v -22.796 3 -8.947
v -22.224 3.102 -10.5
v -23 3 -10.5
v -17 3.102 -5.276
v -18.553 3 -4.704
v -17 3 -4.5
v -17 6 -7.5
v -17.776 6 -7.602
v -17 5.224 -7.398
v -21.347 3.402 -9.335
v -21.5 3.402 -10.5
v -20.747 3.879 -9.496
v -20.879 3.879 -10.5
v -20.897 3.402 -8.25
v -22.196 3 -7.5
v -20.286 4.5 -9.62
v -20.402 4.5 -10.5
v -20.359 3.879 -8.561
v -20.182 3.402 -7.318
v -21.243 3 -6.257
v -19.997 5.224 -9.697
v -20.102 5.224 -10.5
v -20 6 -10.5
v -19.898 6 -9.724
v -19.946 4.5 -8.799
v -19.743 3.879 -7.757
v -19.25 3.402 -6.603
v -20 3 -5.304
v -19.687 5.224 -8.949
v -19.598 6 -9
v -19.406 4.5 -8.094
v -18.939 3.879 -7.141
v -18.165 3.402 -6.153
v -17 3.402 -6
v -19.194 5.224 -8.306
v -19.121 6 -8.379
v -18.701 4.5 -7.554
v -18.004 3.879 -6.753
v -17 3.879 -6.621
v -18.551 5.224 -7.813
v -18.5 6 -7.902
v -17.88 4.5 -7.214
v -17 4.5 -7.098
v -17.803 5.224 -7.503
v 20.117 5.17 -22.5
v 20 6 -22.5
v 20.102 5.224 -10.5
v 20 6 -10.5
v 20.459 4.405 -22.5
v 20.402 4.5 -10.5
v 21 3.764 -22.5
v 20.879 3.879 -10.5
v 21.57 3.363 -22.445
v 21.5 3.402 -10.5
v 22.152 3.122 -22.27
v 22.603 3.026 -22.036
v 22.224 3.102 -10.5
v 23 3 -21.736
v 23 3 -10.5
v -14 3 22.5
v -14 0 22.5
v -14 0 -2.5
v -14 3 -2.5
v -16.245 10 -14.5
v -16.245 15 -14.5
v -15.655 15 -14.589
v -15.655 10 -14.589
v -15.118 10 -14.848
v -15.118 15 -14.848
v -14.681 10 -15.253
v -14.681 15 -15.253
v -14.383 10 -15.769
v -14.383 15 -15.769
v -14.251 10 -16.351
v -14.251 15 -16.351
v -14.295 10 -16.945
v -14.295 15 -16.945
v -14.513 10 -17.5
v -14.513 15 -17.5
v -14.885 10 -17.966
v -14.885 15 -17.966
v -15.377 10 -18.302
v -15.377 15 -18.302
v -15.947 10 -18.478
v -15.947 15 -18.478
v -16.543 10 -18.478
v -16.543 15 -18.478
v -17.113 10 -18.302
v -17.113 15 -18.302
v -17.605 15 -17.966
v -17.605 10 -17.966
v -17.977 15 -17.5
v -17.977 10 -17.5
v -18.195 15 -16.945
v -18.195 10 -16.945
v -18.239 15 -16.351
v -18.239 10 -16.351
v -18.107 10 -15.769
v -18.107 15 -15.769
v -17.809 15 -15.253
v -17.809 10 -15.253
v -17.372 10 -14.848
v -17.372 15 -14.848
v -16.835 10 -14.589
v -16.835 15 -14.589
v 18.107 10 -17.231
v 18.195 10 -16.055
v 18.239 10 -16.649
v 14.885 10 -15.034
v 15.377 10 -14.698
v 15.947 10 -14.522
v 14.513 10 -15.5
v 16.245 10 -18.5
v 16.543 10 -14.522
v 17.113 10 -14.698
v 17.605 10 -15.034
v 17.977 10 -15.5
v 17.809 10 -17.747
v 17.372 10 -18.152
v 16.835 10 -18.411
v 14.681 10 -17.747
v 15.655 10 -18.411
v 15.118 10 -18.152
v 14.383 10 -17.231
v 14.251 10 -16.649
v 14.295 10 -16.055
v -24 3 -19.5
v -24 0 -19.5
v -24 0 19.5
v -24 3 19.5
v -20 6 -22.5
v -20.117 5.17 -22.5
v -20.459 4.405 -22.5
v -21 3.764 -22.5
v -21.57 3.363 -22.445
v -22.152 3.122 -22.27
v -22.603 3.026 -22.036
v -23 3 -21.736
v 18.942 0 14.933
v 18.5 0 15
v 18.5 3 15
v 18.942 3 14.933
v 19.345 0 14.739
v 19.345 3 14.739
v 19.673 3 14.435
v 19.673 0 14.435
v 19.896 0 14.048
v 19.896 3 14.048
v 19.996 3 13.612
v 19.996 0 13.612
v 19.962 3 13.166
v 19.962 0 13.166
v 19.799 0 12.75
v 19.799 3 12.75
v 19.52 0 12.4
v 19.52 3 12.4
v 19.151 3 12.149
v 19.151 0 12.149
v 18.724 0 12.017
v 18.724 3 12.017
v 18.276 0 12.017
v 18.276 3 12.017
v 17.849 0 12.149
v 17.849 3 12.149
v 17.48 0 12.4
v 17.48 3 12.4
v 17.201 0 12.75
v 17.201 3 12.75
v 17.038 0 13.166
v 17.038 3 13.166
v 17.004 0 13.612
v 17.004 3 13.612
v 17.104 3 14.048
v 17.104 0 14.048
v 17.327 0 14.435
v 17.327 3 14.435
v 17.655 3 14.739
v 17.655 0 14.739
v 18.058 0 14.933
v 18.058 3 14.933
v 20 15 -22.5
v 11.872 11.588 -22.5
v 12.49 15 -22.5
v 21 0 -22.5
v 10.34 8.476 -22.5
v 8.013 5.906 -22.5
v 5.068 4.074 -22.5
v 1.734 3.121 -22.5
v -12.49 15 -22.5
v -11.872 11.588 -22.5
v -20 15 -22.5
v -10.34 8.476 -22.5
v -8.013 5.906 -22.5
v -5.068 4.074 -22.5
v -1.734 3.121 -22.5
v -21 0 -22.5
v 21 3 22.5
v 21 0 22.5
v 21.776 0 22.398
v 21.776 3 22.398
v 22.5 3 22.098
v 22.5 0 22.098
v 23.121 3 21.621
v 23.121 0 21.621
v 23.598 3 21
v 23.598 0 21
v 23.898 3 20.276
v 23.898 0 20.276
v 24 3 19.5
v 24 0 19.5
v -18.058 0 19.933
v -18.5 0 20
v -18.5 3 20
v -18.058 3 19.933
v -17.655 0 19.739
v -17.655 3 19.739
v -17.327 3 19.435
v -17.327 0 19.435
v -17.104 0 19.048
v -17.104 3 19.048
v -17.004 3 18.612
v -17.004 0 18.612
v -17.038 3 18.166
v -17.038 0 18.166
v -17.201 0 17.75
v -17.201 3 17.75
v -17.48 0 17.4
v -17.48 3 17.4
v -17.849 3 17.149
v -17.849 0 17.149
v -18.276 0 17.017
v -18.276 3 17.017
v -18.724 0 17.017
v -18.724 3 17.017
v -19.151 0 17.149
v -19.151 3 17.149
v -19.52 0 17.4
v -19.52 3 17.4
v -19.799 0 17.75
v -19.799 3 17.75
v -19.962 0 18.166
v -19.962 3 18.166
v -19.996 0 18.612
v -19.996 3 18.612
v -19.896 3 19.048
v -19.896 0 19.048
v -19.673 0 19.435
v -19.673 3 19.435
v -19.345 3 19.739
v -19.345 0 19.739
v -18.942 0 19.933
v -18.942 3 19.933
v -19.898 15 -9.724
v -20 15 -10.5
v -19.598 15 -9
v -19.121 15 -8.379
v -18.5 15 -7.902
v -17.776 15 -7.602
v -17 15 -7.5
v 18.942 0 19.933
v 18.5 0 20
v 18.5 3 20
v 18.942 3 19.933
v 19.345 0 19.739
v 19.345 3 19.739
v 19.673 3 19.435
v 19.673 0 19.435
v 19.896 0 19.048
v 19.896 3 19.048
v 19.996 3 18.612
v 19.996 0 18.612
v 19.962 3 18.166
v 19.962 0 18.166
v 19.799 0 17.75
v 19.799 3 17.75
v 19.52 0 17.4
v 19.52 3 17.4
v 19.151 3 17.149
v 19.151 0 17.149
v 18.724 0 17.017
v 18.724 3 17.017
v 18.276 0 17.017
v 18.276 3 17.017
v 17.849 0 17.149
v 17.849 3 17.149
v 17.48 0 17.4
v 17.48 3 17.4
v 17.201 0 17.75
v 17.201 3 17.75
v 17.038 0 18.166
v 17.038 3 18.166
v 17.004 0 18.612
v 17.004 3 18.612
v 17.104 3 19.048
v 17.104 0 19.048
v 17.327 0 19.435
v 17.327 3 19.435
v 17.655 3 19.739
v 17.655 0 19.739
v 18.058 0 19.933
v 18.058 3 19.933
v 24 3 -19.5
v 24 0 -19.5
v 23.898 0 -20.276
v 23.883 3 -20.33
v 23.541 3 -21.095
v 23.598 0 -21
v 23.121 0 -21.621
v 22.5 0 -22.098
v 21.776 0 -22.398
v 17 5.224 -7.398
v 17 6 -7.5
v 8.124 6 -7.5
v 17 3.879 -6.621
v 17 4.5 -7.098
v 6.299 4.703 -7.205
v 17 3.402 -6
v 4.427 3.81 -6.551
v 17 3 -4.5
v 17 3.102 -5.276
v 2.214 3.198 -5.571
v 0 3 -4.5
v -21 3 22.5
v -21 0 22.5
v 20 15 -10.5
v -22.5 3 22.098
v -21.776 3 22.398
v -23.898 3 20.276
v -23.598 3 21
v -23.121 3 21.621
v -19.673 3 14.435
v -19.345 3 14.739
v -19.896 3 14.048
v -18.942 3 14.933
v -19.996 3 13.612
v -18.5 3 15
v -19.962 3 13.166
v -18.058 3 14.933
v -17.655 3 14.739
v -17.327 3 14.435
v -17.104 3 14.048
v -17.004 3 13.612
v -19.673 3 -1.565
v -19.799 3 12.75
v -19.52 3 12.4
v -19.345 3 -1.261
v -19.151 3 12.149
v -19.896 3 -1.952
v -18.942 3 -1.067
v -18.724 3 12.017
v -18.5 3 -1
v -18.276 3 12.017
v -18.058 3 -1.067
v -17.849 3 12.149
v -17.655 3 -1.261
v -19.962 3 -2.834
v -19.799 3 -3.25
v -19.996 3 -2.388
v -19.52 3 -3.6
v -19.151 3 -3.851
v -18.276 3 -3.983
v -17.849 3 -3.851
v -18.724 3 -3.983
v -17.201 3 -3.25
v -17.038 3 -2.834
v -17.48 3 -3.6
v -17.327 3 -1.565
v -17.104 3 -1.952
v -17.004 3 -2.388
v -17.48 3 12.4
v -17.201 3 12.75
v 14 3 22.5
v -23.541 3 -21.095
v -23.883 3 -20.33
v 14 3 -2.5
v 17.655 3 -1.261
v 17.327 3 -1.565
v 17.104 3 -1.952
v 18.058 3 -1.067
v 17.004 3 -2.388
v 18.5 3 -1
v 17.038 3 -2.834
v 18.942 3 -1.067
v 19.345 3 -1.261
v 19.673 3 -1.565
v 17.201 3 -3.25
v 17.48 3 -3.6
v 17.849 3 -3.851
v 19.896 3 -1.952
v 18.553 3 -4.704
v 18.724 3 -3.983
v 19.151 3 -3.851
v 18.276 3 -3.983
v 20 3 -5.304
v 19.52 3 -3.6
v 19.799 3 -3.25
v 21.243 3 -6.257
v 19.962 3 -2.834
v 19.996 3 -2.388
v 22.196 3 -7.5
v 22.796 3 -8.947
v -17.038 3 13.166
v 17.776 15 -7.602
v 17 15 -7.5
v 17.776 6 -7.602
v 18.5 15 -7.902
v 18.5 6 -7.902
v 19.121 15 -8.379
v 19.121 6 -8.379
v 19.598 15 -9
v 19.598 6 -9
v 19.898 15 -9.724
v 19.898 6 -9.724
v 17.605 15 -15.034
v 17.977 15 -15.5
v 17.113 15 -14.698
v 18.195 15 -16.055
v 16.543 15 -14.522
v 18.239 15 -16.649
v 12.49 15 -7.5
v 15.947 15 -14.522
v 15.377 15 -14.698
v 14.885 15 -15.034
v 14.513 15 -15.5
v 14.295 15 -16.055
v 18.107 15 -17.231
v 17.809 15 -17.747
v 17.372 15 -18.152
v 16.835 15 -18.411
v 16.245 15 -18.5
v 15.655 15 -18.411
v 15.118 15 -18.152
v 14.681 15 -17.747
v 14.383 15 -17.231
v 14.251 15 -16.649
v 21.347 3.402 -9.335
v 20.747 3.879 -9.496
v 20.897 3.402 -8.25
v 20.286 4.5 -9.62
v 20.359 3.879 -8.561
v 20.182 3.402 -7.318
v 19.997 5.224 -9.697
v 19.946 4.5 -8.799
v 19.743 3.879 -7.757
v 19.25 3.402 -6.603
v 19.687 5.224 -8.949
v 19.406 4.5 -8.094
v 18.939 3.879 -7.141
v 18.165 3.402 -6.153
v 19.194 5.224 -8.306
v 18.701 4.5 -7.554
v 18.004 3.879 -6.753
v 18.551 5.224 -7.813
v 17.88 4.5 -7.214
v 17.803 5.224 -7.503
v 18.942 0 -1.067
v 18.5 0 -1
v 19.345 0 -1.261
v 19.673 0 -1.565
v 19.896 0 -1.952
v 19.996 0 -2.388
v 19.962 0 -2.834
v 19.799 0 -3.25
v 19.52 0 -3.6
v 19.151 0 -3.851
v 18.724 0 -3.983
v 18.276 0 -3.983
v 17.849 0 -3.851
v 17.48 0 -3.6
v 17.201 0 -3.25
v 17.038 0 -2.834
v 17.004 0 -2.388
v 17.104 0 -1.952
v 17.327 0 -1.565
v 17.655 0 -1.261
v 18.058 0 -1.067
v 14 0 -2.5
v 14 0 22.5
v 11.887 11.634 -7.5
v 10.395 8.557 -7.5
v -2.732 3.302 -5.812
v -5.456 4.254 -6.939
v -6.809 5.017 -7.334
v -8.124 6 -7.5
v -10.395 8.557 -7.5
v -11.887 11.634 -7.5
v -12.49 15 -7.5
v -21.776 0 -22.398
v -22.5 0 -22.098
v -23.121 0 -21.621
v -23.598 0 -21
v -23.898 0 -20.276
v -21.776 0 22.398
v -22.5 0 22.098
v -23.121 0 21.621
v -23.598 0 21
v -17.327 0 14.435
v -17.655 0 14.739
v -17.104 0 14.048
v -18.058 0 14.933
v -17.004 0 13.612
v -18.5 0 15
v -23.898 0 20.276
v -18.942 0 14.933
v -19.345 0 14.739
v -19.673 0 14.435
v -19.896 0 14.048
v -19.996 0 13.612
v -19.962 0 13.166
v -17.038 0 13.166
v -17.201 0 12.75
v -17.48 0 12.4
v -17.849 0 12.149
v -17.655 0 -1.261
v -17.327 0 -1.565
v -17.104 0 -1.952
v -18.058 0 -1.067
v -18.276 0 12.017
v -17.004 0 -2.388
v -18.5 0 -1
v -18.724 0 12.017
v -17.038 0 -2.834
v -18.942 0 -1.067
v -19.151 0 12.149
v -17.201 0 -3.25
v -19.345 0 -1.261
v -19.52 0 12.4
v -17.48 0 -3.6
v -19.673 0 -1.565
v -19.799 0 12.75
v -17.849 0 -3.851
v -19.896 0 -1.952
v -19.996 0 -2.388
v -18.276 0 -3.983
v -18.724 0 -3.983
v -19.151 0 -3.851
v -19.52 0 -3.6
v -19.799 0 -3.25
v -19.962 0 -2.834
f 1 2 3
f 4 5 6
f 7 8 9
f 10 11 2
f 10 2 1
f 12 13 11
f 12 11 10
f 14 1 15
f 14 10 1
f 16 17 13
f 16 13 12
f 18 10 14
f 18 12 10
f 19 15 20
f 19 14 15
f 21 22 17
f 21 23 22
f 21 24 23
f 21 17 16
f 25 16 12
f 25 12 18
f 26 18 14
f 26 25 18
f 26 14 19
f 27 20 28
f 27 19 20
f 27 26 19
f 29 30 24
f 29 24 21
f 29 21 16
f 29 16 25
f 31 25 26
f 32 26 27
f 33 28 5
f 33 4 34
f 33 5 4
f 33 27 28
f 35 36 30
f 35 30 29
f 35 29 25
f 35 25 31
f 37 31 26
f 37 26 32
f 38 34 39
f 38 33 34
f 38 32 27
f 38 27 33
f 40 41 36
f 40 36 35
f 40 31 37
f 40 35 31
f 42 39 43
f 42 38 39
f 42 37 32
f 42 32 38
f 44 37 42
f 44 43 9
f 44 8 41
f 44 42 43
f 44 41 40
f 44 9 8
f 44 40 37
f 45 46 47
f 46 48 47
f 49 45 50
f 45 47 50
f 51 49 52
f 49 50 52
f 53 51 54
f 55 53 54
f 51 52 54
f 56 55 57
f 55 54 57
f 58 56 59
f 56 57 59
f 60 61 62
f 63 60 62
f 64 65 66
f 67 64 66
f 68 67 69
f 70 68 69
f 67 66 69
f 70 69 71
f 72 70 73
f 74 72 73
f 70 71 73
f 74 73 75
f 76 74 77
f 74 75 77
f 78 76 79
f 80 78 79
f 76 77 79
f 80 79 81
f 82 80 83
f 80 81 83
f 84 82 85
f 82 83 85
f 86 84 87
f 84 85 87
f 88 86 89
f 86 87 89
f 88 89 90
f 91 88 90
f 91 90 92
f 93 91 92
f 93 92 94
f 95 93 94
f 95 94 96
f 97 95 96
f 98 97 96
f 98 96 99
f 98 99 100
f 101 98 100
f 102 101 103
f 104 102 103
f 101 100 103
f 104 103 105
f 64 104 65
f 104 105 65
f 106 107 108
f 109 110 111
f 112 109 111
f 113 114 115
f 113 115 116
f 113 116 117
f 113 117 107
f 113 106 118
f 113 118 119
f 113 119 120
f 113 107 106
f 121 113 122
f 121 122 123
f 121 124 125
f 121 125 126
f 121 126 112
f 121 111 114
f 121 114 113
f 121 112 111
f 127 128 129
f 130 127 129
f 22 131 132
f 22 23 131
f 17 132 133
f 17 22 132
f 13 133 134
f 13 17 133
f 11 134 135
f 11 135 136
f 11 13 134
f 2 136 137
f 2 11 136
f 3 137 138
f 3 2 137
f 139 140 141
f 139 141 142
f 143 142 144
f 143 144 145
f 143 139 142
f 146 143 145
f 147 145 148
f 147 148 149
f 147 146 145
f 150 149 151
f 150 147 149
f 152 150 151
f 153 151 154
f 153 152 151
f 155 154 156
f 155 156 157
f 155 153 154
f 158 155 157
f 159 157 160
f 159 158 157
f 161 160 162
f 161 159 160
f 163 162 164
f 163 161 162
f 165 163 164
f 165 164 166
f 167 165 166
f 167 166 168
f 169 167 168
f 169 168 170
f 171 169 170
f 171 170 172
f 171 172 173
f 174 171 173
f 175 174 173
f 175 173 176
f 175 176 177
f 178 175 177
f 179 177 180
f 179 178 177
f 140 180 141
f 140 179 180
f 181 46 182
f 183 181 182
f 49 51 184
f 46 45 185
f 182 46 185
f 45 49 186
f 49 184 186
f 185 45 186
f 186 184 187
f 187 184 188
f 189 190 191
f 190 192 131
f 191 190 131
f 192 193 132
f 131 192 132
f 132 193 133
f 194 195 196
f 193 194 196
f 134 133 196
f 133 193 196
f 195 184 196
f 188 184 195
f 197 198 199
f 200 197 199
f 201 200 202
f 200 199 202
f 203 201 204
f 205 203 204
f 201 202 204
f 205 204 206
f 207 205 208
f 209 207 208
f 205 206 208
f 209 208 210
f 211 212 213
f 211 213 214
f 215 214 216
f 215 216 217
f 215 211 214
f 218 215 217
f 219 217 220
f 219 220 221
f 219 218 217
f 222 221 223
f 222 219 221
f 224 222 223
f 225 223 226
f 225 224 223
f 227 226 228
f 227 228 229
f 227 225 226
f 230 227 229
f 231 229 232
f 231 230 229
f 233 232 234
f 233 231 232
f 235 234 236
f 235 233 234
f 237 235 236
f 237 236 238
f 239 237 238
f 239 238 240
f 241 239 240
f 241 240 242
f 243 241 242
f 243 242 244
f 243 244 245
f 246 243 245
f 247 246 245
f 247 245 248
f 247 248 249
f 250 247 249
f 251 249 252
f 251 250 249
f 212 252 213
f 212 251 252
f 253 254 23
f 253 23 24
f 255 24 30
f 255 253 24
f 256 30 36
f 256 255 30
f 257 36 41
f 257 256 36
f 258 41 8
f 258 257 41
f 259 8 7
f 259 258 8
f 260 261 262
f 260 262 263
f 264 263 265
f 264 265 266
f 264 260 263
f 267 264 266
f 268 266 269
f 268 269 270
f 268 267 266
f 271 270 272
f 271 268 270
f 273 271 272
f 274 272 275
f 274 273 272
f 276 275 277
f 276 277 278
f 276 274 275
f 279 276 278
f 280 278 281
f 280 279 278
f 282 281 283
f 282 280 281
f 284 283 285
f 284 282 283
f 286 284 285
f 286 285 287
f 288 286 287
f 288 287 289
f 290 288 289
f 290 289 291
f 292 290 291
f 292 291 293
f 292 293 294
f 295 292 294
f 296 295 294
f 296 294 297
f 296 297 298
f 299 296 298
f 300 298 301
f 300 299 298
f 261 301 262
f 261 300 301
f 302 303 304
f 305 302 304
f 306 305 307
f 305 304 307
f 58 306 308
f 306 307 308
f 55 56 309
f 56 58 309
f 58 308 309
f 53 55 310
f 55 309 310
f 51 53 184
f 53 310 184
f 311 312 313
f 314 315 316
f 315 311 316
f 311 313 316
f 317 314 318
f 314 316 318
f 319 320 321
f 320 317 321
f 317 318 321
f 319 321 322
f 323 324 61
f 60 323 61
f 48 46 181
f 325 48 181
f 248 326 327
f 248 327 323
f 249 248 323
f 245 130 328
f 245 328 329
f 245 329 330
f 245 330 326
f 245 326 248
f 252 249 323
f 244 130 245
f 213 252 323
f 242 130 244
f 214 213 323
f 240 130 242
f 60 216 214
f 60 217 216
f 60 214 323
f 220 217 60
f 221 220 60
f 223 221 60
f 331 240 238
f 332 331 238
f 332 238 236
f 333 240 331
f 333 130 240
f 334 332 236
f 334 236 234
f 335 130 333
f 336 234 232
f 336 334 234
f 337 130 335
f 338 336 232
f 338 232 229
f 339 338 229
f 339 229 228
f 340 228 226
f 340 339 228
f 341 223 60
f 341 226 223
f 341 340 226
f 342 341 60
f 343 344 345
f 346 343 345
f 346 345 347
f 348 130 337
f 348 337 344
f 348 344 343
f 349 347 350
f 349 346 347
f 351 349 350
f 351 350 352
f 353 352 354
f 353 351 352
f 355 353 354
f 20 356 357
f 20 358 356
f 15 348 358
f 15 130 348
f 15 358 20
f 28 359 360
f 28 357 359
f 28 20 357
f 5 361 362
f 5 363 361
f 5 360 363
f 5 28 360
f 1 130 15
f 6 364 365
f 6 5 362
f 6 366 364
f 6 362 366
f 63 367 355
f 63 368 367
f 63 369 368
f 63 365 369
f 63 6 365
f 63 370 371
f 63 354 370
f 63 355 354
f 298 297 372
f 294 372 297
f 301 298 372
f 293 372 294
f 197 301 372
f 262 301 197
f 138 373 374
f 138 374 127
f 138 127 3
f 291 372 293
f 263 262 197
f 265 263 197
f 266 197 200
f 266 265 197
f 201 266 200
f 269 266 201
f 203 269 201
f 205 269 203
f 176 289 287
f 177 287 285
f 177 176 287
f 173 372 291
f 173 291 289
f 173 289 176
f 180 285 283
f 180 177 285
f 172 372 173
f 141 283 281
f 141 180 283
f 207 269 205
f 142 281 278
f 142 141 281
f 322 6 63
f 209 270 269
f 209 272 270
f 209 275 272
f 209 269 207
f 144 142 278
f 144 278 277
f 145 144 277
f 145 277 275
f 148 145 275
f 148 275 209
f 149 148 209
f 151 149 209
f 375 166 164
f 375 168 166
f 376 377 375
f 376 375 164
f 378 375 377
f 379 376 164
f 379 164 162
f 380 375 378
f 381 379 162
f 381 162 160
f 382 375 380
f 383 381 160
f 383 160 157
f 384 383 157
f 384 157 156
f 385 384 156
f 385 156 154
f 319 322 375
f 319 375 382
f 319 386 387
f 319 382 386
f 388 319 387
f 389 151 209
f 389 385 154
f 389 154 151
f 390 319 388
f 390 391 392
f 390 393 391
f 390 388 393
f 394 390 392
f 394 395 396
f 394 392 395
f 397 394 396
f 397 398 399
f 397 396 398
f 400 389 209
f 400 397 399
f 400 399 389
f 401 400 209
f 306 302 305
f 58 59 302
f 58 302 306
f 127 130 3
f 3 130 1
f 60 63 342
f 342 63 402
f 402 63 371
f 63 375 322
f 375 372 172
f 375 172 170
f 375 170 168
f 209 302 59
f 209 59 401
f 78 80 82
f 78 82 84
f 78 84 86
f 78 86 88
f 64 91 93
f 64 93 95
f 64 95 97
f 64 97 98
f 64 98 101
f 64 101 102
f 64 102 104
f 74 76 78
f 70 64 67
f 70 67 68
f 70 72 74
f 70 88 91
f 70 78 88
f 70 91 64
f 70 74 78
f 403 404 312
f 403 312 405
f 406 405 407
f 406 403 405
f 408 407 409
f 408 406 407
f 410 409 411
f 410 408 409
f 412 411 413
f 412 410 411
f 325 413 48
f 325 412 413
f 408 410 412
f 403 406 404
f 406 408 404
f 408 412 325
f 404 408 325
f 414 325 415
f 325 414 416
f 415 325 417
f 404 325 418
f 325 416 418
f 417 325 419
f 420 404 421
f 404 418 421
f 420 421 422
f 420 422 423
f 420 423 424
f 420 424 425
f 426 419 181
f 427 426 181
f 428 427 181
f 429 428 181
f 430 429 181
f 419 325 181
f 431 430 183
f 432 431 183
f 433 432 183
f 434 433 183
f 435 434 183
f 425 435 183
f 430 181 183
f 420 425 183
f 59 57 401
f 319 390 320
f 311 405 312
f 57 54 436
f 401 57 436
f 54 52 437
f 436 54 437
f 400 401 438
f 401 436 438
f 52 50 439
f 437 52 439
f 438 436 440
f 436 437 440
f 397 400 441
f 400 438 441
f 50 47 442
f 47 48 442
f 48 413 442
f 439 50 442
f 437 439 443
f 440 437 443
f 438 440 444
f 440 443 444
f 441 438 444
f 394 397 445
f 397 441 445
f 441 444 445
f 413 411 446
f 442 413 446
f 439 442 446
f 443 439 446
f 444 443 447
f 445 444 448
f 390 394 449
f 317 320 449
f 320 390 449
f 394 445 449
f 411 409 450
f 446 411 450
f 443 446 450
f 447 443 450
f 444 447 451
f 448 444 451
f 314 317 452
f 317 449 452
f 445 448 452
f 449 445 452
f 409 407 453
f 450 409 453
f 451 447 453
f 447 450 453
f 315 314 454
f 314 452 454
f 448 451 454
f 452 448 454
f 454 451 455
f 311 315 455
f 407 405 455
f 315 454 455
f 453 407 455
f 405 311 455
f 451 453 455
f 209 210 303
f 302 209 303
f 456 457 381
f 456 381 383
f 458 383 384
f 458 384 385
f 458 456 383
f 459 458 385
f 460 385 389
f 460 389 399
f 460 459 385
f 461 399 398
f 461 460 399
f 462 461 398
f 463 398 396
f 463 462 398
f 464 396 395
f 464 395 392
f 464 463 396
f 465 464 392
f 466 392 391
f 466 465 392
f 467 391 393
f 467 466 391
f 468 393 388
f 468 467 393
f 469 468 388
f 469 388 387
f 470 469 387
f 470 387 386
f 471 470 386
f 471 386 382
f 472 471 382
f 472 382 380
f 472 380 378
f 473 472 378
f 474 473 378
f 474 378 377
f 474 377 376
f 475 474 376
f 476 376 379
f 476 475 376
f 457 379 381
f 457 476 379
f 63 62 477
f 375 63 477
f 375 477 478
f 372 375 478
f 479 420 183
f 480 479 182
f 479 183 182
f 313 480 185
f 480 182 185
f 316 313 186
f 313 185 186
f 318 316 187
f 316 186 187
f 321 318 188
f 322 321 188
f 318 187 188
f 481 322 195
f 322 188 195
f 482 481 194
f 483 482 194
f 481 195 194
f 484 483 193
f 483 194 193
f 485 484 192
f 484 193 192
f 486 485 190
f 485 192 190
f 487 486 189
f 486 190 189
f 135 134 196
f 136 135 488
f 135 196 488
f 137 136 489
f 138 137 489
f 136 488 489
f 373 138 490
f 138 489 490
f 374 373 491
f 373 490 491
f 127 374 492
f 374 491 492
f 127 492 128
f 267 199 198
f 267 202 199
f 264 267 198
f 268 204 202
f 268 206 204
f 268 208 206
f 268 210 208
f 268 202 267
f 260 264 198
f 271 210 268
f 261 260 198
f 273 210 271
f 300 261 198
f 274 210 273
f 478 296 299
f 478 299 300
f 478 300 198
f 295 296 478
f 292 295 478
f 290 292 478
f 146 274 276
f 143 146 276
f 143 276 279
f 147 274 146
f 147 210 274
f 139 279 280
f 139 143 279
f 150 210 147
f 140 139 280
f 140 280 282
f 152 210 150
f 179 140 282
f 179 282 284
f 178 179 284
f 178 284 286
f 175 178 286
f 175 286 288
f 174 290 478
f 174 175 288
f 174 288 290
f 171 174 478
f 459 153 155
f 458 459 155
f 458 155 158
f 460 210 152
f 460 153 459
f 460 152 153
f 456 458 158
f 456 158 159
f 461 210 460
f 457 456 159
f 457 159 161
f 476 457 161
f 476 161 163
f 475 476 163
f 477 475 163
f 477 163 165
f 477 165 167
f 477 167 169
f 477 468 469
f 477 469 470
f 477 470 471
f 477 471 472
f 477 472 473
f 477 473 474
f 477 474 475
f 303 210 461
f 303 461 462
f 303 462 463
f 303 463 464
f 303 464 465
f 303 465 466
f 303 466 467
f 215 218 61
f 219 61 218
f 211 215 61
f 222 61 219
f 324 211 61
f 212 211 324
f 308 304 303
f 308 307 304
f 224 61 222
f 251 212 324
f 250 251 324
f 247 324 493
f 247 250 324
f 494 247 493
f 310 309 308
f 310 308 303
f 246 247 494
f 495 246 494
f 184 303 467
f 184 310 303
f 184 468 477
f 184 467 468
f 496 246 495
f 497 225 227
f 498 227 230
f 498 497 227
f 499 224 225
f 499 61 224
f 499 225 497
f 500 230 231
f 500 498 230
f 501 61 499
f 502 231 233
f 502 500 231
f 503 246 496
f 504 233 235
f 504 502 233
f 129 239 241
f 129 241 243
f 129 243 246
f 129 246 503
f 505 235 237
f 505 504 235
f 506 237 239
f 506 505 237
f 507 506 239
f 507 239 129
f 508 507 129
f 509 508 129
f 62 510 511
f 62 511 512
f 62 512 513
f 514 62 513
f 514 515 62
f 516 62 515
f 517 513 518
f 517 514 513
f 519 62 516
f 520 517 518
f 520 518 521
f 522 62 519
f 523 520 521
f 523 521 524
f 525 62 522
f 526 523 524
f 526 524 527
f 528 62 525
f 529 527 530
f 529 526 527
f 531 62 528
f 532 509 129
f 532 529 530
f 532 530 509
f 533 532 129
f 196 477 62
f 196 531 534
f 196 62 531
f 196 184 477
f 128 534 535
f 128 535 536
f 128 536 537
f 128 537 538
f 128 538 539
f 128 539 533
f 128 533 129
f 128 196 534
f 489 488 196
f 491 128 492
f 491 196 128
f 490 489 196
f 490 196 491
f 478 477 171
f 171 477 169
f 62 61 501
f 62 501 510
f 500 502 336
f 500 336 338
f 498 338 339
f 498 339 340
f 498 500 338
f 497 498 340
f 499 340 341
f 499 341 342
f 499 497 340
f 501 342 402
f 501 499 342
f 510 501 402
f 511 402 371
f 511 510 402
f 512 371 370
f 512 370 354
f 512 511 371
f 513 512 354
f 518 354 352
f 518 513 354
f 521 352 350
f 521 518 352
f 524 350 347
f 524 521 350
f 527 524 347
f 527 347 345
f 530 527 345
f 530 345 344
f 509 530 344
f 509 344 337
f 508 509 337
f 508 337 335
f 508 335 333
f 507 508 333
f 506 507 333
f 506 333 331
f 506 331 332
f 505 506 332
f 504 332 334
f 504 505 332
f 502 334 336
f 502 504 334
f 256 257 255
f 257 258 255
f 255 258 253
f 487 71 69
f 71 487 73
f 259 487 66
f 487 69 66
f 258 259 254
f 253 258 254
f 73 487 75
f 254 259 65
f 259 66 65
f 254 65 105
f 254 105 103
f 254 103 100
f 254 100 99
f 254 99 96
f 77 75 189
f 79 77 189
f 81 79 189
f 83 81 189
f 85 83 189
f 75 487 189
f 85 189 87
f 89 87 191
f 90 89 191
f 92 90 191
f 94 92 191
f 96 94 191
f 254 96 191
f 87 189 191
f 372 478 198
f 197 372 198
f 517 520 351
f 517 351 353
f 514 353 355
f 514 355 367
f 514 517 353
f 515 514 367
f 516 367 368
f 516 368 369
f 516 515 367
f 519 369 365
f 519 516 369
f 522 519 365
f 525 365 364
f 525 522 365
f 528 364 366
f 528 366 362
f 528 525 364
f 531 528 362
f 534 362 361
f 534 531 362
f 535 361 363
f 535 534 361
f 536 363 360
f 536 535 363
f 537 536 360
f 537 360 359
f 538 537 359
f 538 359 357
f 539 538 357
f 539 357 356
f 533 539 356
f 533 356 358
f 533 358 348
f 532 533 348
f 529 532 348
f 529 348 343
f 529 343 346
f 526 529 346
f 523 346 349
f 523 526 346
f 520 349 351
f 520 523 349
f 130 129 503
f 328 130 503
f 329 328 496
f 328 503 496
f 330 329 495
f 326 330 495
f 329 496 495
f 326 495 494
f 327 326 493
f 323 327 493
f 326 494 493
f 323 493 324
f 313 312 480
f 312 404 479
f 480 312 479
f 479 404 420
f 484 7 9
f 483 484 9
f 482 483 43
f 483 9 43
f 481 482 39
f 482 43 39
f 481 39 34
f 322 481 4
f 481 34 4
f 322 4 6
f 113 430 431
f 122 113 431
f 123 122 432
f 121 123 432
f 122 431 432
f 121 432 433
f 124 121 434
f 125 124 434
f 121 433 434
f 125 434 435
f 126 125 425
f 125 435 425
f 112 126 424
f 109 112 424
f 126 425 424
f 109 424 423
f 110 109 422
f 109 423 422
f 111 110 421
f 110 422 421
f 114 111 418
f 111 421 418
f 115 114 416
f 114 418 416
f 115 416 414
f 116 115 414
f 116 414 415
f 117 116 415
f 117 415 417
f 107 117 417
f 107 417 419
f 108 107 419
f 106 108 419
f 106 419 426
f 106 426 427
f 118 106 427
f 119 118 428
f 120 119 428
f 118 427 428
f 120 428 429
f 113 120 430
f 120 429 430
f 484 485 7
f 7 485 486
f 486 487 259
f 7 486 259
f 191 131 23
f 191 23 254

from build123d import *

# Parameters (mm, degrees)
SKETCH1_R           = 1.5
BOSS_EXTRUDE1_DEPTH = 3
SKETCH4_W           = 40
SKETCH4_H           = 15
BOSS_EXTRUDE2_DEPTH = 15
FILLET5_R           = 3
SKETCH5_R           = 12.5
CUT_EXTRUDE1_DEPTH  = 54.160135485
SKETCH6_R           = 2
CUT_EXTRUDE2_DEPTH  = 5


with BuildPart() as part:
    # Sketch1 → Boss-Extrude1 (new body)
    with BuildSketch(Plane(origin=(0, 0, 0), x_dir=(1, 0, 0), z_dir=(0, 1, 0))):
        with BuildLine():
            Line((21, 22.5), (-21, 22.5))
            ThreePointArc((-21, 22.5), (-23.121320344, 21.621320344), (-24, 19.5))
            Line((-24, 19.5), (-24, -19.5))
            ThreePointArc((-24, -19.5), (-23.121320344, -21.621320344), (-21, -22.5))
            Line((-21, -22.5), (-14, -22.5))
            Line((-14, -22.5), (-14, 2.5))
            Line((-14, 2.5), (14, 2.5))
            Line((14, 2.5), (14, -22.5))
            Line((14, -22.5), (21, -22.5))
            ThreePointArc((21, -22.5), (23.121320344, -21.621320344), (24, -19.5))
            Line((24, -19.5), (24, 19.5))
            ThreePointArc((24, 19.5), (23.121320344, 21.621320344), (21, 22.5))
        make_face()
        with Locations(Location((-18.5, -18.5, 0), (0, 0, 270))):
            Circle(SKETCH1_R, mode=Mode.SUBTRACT)
        with Locations(Location((-18.5, -13.5, 0), (0, 0, 270))):
            Circle(SKETCH1_R, mode=Mode.SUBTRACT)
        with Locations(Location((18.5, -18.5, 0), (0, 0, 270))):
            Circle(SKETCH1_R, mode=Mode.SUBTRACT)
        with Locations(Location((18.5, -13.5, 0), (0, 0, 270))):
            Circle(SKETCH1_R, mode=Mode.SUBTRACT)
        with Locations(Location((-18.5, 2.5, 0), (0, 0, 270))):
            Circle(SKETCH1_R, mode=Mode.SUBTRACT)
        with Locations(Location((18.5, 2.5, 0), (0, 0, 270))):
            Circle(SKETCH1_R, mode=Mode.SUBTRACT)
    extrude(amount=BOSS_EXTRUDE1_DEPTH)

    # Sketch4 → Boss-Extrude2 (add)
    with BuildSketch(Plane(origin=(0, 0, -22.5), x_dir=(-1, 0, 0), z_dir=(0, 0, -1))):
        with Locations((0, 7.5)):
            Rectangle(SKETCH4_W, SKETCH4_H)
    extrude(amount=-BOSS_EXTRUDE2_DEPTH)

    # Fillet5
    fillet5_edges = [part.edges().sort_by_distance(p)[0] for p in [
        (20, 3, -15),
        (-20, 3, -15),
        (0, 3, -7.5),
        (20, 9, -7.5),
        (-20, 9, -7.5),
    ]]
    fillet(fillet5_edges, radius=FILLET5_R)

    # Sketch5 → Cut-Extrude1 (cut, through all)
    with BuildSketch(Plane(origin=(0, 0, -22.5), x_dir=(-1, 0, 0), z_dir=(0, 0, -1))):
        with Locations((0, 15.5)):
            Circle(SKETCH5_R)
    extrude(amount=-CUT_EXTRUDE1_DEPTH, mode=Mode.SUBTRACT)

    # Sketch6 → Cut-Extrude2 (cut)
    with BuildSketch(Plane(origin=(0, 15, 0), x_dir=(1, 0, 0), z_dir=(0, 1, 0))):
        with Locations(Location((-16.244997998, 16.5, 0), (0, 0, 270))):
            Circle(SKETCH6_R)
        with Locations(Location((16.244997998, 16.5, 0), (0, 0, 90))):
            Circle(SKETCH6_R)
    extrude(amount=-CUT_EXTRUDE2_DEPTH, mode=Mode.SUBTRACT)


solid = part.part
